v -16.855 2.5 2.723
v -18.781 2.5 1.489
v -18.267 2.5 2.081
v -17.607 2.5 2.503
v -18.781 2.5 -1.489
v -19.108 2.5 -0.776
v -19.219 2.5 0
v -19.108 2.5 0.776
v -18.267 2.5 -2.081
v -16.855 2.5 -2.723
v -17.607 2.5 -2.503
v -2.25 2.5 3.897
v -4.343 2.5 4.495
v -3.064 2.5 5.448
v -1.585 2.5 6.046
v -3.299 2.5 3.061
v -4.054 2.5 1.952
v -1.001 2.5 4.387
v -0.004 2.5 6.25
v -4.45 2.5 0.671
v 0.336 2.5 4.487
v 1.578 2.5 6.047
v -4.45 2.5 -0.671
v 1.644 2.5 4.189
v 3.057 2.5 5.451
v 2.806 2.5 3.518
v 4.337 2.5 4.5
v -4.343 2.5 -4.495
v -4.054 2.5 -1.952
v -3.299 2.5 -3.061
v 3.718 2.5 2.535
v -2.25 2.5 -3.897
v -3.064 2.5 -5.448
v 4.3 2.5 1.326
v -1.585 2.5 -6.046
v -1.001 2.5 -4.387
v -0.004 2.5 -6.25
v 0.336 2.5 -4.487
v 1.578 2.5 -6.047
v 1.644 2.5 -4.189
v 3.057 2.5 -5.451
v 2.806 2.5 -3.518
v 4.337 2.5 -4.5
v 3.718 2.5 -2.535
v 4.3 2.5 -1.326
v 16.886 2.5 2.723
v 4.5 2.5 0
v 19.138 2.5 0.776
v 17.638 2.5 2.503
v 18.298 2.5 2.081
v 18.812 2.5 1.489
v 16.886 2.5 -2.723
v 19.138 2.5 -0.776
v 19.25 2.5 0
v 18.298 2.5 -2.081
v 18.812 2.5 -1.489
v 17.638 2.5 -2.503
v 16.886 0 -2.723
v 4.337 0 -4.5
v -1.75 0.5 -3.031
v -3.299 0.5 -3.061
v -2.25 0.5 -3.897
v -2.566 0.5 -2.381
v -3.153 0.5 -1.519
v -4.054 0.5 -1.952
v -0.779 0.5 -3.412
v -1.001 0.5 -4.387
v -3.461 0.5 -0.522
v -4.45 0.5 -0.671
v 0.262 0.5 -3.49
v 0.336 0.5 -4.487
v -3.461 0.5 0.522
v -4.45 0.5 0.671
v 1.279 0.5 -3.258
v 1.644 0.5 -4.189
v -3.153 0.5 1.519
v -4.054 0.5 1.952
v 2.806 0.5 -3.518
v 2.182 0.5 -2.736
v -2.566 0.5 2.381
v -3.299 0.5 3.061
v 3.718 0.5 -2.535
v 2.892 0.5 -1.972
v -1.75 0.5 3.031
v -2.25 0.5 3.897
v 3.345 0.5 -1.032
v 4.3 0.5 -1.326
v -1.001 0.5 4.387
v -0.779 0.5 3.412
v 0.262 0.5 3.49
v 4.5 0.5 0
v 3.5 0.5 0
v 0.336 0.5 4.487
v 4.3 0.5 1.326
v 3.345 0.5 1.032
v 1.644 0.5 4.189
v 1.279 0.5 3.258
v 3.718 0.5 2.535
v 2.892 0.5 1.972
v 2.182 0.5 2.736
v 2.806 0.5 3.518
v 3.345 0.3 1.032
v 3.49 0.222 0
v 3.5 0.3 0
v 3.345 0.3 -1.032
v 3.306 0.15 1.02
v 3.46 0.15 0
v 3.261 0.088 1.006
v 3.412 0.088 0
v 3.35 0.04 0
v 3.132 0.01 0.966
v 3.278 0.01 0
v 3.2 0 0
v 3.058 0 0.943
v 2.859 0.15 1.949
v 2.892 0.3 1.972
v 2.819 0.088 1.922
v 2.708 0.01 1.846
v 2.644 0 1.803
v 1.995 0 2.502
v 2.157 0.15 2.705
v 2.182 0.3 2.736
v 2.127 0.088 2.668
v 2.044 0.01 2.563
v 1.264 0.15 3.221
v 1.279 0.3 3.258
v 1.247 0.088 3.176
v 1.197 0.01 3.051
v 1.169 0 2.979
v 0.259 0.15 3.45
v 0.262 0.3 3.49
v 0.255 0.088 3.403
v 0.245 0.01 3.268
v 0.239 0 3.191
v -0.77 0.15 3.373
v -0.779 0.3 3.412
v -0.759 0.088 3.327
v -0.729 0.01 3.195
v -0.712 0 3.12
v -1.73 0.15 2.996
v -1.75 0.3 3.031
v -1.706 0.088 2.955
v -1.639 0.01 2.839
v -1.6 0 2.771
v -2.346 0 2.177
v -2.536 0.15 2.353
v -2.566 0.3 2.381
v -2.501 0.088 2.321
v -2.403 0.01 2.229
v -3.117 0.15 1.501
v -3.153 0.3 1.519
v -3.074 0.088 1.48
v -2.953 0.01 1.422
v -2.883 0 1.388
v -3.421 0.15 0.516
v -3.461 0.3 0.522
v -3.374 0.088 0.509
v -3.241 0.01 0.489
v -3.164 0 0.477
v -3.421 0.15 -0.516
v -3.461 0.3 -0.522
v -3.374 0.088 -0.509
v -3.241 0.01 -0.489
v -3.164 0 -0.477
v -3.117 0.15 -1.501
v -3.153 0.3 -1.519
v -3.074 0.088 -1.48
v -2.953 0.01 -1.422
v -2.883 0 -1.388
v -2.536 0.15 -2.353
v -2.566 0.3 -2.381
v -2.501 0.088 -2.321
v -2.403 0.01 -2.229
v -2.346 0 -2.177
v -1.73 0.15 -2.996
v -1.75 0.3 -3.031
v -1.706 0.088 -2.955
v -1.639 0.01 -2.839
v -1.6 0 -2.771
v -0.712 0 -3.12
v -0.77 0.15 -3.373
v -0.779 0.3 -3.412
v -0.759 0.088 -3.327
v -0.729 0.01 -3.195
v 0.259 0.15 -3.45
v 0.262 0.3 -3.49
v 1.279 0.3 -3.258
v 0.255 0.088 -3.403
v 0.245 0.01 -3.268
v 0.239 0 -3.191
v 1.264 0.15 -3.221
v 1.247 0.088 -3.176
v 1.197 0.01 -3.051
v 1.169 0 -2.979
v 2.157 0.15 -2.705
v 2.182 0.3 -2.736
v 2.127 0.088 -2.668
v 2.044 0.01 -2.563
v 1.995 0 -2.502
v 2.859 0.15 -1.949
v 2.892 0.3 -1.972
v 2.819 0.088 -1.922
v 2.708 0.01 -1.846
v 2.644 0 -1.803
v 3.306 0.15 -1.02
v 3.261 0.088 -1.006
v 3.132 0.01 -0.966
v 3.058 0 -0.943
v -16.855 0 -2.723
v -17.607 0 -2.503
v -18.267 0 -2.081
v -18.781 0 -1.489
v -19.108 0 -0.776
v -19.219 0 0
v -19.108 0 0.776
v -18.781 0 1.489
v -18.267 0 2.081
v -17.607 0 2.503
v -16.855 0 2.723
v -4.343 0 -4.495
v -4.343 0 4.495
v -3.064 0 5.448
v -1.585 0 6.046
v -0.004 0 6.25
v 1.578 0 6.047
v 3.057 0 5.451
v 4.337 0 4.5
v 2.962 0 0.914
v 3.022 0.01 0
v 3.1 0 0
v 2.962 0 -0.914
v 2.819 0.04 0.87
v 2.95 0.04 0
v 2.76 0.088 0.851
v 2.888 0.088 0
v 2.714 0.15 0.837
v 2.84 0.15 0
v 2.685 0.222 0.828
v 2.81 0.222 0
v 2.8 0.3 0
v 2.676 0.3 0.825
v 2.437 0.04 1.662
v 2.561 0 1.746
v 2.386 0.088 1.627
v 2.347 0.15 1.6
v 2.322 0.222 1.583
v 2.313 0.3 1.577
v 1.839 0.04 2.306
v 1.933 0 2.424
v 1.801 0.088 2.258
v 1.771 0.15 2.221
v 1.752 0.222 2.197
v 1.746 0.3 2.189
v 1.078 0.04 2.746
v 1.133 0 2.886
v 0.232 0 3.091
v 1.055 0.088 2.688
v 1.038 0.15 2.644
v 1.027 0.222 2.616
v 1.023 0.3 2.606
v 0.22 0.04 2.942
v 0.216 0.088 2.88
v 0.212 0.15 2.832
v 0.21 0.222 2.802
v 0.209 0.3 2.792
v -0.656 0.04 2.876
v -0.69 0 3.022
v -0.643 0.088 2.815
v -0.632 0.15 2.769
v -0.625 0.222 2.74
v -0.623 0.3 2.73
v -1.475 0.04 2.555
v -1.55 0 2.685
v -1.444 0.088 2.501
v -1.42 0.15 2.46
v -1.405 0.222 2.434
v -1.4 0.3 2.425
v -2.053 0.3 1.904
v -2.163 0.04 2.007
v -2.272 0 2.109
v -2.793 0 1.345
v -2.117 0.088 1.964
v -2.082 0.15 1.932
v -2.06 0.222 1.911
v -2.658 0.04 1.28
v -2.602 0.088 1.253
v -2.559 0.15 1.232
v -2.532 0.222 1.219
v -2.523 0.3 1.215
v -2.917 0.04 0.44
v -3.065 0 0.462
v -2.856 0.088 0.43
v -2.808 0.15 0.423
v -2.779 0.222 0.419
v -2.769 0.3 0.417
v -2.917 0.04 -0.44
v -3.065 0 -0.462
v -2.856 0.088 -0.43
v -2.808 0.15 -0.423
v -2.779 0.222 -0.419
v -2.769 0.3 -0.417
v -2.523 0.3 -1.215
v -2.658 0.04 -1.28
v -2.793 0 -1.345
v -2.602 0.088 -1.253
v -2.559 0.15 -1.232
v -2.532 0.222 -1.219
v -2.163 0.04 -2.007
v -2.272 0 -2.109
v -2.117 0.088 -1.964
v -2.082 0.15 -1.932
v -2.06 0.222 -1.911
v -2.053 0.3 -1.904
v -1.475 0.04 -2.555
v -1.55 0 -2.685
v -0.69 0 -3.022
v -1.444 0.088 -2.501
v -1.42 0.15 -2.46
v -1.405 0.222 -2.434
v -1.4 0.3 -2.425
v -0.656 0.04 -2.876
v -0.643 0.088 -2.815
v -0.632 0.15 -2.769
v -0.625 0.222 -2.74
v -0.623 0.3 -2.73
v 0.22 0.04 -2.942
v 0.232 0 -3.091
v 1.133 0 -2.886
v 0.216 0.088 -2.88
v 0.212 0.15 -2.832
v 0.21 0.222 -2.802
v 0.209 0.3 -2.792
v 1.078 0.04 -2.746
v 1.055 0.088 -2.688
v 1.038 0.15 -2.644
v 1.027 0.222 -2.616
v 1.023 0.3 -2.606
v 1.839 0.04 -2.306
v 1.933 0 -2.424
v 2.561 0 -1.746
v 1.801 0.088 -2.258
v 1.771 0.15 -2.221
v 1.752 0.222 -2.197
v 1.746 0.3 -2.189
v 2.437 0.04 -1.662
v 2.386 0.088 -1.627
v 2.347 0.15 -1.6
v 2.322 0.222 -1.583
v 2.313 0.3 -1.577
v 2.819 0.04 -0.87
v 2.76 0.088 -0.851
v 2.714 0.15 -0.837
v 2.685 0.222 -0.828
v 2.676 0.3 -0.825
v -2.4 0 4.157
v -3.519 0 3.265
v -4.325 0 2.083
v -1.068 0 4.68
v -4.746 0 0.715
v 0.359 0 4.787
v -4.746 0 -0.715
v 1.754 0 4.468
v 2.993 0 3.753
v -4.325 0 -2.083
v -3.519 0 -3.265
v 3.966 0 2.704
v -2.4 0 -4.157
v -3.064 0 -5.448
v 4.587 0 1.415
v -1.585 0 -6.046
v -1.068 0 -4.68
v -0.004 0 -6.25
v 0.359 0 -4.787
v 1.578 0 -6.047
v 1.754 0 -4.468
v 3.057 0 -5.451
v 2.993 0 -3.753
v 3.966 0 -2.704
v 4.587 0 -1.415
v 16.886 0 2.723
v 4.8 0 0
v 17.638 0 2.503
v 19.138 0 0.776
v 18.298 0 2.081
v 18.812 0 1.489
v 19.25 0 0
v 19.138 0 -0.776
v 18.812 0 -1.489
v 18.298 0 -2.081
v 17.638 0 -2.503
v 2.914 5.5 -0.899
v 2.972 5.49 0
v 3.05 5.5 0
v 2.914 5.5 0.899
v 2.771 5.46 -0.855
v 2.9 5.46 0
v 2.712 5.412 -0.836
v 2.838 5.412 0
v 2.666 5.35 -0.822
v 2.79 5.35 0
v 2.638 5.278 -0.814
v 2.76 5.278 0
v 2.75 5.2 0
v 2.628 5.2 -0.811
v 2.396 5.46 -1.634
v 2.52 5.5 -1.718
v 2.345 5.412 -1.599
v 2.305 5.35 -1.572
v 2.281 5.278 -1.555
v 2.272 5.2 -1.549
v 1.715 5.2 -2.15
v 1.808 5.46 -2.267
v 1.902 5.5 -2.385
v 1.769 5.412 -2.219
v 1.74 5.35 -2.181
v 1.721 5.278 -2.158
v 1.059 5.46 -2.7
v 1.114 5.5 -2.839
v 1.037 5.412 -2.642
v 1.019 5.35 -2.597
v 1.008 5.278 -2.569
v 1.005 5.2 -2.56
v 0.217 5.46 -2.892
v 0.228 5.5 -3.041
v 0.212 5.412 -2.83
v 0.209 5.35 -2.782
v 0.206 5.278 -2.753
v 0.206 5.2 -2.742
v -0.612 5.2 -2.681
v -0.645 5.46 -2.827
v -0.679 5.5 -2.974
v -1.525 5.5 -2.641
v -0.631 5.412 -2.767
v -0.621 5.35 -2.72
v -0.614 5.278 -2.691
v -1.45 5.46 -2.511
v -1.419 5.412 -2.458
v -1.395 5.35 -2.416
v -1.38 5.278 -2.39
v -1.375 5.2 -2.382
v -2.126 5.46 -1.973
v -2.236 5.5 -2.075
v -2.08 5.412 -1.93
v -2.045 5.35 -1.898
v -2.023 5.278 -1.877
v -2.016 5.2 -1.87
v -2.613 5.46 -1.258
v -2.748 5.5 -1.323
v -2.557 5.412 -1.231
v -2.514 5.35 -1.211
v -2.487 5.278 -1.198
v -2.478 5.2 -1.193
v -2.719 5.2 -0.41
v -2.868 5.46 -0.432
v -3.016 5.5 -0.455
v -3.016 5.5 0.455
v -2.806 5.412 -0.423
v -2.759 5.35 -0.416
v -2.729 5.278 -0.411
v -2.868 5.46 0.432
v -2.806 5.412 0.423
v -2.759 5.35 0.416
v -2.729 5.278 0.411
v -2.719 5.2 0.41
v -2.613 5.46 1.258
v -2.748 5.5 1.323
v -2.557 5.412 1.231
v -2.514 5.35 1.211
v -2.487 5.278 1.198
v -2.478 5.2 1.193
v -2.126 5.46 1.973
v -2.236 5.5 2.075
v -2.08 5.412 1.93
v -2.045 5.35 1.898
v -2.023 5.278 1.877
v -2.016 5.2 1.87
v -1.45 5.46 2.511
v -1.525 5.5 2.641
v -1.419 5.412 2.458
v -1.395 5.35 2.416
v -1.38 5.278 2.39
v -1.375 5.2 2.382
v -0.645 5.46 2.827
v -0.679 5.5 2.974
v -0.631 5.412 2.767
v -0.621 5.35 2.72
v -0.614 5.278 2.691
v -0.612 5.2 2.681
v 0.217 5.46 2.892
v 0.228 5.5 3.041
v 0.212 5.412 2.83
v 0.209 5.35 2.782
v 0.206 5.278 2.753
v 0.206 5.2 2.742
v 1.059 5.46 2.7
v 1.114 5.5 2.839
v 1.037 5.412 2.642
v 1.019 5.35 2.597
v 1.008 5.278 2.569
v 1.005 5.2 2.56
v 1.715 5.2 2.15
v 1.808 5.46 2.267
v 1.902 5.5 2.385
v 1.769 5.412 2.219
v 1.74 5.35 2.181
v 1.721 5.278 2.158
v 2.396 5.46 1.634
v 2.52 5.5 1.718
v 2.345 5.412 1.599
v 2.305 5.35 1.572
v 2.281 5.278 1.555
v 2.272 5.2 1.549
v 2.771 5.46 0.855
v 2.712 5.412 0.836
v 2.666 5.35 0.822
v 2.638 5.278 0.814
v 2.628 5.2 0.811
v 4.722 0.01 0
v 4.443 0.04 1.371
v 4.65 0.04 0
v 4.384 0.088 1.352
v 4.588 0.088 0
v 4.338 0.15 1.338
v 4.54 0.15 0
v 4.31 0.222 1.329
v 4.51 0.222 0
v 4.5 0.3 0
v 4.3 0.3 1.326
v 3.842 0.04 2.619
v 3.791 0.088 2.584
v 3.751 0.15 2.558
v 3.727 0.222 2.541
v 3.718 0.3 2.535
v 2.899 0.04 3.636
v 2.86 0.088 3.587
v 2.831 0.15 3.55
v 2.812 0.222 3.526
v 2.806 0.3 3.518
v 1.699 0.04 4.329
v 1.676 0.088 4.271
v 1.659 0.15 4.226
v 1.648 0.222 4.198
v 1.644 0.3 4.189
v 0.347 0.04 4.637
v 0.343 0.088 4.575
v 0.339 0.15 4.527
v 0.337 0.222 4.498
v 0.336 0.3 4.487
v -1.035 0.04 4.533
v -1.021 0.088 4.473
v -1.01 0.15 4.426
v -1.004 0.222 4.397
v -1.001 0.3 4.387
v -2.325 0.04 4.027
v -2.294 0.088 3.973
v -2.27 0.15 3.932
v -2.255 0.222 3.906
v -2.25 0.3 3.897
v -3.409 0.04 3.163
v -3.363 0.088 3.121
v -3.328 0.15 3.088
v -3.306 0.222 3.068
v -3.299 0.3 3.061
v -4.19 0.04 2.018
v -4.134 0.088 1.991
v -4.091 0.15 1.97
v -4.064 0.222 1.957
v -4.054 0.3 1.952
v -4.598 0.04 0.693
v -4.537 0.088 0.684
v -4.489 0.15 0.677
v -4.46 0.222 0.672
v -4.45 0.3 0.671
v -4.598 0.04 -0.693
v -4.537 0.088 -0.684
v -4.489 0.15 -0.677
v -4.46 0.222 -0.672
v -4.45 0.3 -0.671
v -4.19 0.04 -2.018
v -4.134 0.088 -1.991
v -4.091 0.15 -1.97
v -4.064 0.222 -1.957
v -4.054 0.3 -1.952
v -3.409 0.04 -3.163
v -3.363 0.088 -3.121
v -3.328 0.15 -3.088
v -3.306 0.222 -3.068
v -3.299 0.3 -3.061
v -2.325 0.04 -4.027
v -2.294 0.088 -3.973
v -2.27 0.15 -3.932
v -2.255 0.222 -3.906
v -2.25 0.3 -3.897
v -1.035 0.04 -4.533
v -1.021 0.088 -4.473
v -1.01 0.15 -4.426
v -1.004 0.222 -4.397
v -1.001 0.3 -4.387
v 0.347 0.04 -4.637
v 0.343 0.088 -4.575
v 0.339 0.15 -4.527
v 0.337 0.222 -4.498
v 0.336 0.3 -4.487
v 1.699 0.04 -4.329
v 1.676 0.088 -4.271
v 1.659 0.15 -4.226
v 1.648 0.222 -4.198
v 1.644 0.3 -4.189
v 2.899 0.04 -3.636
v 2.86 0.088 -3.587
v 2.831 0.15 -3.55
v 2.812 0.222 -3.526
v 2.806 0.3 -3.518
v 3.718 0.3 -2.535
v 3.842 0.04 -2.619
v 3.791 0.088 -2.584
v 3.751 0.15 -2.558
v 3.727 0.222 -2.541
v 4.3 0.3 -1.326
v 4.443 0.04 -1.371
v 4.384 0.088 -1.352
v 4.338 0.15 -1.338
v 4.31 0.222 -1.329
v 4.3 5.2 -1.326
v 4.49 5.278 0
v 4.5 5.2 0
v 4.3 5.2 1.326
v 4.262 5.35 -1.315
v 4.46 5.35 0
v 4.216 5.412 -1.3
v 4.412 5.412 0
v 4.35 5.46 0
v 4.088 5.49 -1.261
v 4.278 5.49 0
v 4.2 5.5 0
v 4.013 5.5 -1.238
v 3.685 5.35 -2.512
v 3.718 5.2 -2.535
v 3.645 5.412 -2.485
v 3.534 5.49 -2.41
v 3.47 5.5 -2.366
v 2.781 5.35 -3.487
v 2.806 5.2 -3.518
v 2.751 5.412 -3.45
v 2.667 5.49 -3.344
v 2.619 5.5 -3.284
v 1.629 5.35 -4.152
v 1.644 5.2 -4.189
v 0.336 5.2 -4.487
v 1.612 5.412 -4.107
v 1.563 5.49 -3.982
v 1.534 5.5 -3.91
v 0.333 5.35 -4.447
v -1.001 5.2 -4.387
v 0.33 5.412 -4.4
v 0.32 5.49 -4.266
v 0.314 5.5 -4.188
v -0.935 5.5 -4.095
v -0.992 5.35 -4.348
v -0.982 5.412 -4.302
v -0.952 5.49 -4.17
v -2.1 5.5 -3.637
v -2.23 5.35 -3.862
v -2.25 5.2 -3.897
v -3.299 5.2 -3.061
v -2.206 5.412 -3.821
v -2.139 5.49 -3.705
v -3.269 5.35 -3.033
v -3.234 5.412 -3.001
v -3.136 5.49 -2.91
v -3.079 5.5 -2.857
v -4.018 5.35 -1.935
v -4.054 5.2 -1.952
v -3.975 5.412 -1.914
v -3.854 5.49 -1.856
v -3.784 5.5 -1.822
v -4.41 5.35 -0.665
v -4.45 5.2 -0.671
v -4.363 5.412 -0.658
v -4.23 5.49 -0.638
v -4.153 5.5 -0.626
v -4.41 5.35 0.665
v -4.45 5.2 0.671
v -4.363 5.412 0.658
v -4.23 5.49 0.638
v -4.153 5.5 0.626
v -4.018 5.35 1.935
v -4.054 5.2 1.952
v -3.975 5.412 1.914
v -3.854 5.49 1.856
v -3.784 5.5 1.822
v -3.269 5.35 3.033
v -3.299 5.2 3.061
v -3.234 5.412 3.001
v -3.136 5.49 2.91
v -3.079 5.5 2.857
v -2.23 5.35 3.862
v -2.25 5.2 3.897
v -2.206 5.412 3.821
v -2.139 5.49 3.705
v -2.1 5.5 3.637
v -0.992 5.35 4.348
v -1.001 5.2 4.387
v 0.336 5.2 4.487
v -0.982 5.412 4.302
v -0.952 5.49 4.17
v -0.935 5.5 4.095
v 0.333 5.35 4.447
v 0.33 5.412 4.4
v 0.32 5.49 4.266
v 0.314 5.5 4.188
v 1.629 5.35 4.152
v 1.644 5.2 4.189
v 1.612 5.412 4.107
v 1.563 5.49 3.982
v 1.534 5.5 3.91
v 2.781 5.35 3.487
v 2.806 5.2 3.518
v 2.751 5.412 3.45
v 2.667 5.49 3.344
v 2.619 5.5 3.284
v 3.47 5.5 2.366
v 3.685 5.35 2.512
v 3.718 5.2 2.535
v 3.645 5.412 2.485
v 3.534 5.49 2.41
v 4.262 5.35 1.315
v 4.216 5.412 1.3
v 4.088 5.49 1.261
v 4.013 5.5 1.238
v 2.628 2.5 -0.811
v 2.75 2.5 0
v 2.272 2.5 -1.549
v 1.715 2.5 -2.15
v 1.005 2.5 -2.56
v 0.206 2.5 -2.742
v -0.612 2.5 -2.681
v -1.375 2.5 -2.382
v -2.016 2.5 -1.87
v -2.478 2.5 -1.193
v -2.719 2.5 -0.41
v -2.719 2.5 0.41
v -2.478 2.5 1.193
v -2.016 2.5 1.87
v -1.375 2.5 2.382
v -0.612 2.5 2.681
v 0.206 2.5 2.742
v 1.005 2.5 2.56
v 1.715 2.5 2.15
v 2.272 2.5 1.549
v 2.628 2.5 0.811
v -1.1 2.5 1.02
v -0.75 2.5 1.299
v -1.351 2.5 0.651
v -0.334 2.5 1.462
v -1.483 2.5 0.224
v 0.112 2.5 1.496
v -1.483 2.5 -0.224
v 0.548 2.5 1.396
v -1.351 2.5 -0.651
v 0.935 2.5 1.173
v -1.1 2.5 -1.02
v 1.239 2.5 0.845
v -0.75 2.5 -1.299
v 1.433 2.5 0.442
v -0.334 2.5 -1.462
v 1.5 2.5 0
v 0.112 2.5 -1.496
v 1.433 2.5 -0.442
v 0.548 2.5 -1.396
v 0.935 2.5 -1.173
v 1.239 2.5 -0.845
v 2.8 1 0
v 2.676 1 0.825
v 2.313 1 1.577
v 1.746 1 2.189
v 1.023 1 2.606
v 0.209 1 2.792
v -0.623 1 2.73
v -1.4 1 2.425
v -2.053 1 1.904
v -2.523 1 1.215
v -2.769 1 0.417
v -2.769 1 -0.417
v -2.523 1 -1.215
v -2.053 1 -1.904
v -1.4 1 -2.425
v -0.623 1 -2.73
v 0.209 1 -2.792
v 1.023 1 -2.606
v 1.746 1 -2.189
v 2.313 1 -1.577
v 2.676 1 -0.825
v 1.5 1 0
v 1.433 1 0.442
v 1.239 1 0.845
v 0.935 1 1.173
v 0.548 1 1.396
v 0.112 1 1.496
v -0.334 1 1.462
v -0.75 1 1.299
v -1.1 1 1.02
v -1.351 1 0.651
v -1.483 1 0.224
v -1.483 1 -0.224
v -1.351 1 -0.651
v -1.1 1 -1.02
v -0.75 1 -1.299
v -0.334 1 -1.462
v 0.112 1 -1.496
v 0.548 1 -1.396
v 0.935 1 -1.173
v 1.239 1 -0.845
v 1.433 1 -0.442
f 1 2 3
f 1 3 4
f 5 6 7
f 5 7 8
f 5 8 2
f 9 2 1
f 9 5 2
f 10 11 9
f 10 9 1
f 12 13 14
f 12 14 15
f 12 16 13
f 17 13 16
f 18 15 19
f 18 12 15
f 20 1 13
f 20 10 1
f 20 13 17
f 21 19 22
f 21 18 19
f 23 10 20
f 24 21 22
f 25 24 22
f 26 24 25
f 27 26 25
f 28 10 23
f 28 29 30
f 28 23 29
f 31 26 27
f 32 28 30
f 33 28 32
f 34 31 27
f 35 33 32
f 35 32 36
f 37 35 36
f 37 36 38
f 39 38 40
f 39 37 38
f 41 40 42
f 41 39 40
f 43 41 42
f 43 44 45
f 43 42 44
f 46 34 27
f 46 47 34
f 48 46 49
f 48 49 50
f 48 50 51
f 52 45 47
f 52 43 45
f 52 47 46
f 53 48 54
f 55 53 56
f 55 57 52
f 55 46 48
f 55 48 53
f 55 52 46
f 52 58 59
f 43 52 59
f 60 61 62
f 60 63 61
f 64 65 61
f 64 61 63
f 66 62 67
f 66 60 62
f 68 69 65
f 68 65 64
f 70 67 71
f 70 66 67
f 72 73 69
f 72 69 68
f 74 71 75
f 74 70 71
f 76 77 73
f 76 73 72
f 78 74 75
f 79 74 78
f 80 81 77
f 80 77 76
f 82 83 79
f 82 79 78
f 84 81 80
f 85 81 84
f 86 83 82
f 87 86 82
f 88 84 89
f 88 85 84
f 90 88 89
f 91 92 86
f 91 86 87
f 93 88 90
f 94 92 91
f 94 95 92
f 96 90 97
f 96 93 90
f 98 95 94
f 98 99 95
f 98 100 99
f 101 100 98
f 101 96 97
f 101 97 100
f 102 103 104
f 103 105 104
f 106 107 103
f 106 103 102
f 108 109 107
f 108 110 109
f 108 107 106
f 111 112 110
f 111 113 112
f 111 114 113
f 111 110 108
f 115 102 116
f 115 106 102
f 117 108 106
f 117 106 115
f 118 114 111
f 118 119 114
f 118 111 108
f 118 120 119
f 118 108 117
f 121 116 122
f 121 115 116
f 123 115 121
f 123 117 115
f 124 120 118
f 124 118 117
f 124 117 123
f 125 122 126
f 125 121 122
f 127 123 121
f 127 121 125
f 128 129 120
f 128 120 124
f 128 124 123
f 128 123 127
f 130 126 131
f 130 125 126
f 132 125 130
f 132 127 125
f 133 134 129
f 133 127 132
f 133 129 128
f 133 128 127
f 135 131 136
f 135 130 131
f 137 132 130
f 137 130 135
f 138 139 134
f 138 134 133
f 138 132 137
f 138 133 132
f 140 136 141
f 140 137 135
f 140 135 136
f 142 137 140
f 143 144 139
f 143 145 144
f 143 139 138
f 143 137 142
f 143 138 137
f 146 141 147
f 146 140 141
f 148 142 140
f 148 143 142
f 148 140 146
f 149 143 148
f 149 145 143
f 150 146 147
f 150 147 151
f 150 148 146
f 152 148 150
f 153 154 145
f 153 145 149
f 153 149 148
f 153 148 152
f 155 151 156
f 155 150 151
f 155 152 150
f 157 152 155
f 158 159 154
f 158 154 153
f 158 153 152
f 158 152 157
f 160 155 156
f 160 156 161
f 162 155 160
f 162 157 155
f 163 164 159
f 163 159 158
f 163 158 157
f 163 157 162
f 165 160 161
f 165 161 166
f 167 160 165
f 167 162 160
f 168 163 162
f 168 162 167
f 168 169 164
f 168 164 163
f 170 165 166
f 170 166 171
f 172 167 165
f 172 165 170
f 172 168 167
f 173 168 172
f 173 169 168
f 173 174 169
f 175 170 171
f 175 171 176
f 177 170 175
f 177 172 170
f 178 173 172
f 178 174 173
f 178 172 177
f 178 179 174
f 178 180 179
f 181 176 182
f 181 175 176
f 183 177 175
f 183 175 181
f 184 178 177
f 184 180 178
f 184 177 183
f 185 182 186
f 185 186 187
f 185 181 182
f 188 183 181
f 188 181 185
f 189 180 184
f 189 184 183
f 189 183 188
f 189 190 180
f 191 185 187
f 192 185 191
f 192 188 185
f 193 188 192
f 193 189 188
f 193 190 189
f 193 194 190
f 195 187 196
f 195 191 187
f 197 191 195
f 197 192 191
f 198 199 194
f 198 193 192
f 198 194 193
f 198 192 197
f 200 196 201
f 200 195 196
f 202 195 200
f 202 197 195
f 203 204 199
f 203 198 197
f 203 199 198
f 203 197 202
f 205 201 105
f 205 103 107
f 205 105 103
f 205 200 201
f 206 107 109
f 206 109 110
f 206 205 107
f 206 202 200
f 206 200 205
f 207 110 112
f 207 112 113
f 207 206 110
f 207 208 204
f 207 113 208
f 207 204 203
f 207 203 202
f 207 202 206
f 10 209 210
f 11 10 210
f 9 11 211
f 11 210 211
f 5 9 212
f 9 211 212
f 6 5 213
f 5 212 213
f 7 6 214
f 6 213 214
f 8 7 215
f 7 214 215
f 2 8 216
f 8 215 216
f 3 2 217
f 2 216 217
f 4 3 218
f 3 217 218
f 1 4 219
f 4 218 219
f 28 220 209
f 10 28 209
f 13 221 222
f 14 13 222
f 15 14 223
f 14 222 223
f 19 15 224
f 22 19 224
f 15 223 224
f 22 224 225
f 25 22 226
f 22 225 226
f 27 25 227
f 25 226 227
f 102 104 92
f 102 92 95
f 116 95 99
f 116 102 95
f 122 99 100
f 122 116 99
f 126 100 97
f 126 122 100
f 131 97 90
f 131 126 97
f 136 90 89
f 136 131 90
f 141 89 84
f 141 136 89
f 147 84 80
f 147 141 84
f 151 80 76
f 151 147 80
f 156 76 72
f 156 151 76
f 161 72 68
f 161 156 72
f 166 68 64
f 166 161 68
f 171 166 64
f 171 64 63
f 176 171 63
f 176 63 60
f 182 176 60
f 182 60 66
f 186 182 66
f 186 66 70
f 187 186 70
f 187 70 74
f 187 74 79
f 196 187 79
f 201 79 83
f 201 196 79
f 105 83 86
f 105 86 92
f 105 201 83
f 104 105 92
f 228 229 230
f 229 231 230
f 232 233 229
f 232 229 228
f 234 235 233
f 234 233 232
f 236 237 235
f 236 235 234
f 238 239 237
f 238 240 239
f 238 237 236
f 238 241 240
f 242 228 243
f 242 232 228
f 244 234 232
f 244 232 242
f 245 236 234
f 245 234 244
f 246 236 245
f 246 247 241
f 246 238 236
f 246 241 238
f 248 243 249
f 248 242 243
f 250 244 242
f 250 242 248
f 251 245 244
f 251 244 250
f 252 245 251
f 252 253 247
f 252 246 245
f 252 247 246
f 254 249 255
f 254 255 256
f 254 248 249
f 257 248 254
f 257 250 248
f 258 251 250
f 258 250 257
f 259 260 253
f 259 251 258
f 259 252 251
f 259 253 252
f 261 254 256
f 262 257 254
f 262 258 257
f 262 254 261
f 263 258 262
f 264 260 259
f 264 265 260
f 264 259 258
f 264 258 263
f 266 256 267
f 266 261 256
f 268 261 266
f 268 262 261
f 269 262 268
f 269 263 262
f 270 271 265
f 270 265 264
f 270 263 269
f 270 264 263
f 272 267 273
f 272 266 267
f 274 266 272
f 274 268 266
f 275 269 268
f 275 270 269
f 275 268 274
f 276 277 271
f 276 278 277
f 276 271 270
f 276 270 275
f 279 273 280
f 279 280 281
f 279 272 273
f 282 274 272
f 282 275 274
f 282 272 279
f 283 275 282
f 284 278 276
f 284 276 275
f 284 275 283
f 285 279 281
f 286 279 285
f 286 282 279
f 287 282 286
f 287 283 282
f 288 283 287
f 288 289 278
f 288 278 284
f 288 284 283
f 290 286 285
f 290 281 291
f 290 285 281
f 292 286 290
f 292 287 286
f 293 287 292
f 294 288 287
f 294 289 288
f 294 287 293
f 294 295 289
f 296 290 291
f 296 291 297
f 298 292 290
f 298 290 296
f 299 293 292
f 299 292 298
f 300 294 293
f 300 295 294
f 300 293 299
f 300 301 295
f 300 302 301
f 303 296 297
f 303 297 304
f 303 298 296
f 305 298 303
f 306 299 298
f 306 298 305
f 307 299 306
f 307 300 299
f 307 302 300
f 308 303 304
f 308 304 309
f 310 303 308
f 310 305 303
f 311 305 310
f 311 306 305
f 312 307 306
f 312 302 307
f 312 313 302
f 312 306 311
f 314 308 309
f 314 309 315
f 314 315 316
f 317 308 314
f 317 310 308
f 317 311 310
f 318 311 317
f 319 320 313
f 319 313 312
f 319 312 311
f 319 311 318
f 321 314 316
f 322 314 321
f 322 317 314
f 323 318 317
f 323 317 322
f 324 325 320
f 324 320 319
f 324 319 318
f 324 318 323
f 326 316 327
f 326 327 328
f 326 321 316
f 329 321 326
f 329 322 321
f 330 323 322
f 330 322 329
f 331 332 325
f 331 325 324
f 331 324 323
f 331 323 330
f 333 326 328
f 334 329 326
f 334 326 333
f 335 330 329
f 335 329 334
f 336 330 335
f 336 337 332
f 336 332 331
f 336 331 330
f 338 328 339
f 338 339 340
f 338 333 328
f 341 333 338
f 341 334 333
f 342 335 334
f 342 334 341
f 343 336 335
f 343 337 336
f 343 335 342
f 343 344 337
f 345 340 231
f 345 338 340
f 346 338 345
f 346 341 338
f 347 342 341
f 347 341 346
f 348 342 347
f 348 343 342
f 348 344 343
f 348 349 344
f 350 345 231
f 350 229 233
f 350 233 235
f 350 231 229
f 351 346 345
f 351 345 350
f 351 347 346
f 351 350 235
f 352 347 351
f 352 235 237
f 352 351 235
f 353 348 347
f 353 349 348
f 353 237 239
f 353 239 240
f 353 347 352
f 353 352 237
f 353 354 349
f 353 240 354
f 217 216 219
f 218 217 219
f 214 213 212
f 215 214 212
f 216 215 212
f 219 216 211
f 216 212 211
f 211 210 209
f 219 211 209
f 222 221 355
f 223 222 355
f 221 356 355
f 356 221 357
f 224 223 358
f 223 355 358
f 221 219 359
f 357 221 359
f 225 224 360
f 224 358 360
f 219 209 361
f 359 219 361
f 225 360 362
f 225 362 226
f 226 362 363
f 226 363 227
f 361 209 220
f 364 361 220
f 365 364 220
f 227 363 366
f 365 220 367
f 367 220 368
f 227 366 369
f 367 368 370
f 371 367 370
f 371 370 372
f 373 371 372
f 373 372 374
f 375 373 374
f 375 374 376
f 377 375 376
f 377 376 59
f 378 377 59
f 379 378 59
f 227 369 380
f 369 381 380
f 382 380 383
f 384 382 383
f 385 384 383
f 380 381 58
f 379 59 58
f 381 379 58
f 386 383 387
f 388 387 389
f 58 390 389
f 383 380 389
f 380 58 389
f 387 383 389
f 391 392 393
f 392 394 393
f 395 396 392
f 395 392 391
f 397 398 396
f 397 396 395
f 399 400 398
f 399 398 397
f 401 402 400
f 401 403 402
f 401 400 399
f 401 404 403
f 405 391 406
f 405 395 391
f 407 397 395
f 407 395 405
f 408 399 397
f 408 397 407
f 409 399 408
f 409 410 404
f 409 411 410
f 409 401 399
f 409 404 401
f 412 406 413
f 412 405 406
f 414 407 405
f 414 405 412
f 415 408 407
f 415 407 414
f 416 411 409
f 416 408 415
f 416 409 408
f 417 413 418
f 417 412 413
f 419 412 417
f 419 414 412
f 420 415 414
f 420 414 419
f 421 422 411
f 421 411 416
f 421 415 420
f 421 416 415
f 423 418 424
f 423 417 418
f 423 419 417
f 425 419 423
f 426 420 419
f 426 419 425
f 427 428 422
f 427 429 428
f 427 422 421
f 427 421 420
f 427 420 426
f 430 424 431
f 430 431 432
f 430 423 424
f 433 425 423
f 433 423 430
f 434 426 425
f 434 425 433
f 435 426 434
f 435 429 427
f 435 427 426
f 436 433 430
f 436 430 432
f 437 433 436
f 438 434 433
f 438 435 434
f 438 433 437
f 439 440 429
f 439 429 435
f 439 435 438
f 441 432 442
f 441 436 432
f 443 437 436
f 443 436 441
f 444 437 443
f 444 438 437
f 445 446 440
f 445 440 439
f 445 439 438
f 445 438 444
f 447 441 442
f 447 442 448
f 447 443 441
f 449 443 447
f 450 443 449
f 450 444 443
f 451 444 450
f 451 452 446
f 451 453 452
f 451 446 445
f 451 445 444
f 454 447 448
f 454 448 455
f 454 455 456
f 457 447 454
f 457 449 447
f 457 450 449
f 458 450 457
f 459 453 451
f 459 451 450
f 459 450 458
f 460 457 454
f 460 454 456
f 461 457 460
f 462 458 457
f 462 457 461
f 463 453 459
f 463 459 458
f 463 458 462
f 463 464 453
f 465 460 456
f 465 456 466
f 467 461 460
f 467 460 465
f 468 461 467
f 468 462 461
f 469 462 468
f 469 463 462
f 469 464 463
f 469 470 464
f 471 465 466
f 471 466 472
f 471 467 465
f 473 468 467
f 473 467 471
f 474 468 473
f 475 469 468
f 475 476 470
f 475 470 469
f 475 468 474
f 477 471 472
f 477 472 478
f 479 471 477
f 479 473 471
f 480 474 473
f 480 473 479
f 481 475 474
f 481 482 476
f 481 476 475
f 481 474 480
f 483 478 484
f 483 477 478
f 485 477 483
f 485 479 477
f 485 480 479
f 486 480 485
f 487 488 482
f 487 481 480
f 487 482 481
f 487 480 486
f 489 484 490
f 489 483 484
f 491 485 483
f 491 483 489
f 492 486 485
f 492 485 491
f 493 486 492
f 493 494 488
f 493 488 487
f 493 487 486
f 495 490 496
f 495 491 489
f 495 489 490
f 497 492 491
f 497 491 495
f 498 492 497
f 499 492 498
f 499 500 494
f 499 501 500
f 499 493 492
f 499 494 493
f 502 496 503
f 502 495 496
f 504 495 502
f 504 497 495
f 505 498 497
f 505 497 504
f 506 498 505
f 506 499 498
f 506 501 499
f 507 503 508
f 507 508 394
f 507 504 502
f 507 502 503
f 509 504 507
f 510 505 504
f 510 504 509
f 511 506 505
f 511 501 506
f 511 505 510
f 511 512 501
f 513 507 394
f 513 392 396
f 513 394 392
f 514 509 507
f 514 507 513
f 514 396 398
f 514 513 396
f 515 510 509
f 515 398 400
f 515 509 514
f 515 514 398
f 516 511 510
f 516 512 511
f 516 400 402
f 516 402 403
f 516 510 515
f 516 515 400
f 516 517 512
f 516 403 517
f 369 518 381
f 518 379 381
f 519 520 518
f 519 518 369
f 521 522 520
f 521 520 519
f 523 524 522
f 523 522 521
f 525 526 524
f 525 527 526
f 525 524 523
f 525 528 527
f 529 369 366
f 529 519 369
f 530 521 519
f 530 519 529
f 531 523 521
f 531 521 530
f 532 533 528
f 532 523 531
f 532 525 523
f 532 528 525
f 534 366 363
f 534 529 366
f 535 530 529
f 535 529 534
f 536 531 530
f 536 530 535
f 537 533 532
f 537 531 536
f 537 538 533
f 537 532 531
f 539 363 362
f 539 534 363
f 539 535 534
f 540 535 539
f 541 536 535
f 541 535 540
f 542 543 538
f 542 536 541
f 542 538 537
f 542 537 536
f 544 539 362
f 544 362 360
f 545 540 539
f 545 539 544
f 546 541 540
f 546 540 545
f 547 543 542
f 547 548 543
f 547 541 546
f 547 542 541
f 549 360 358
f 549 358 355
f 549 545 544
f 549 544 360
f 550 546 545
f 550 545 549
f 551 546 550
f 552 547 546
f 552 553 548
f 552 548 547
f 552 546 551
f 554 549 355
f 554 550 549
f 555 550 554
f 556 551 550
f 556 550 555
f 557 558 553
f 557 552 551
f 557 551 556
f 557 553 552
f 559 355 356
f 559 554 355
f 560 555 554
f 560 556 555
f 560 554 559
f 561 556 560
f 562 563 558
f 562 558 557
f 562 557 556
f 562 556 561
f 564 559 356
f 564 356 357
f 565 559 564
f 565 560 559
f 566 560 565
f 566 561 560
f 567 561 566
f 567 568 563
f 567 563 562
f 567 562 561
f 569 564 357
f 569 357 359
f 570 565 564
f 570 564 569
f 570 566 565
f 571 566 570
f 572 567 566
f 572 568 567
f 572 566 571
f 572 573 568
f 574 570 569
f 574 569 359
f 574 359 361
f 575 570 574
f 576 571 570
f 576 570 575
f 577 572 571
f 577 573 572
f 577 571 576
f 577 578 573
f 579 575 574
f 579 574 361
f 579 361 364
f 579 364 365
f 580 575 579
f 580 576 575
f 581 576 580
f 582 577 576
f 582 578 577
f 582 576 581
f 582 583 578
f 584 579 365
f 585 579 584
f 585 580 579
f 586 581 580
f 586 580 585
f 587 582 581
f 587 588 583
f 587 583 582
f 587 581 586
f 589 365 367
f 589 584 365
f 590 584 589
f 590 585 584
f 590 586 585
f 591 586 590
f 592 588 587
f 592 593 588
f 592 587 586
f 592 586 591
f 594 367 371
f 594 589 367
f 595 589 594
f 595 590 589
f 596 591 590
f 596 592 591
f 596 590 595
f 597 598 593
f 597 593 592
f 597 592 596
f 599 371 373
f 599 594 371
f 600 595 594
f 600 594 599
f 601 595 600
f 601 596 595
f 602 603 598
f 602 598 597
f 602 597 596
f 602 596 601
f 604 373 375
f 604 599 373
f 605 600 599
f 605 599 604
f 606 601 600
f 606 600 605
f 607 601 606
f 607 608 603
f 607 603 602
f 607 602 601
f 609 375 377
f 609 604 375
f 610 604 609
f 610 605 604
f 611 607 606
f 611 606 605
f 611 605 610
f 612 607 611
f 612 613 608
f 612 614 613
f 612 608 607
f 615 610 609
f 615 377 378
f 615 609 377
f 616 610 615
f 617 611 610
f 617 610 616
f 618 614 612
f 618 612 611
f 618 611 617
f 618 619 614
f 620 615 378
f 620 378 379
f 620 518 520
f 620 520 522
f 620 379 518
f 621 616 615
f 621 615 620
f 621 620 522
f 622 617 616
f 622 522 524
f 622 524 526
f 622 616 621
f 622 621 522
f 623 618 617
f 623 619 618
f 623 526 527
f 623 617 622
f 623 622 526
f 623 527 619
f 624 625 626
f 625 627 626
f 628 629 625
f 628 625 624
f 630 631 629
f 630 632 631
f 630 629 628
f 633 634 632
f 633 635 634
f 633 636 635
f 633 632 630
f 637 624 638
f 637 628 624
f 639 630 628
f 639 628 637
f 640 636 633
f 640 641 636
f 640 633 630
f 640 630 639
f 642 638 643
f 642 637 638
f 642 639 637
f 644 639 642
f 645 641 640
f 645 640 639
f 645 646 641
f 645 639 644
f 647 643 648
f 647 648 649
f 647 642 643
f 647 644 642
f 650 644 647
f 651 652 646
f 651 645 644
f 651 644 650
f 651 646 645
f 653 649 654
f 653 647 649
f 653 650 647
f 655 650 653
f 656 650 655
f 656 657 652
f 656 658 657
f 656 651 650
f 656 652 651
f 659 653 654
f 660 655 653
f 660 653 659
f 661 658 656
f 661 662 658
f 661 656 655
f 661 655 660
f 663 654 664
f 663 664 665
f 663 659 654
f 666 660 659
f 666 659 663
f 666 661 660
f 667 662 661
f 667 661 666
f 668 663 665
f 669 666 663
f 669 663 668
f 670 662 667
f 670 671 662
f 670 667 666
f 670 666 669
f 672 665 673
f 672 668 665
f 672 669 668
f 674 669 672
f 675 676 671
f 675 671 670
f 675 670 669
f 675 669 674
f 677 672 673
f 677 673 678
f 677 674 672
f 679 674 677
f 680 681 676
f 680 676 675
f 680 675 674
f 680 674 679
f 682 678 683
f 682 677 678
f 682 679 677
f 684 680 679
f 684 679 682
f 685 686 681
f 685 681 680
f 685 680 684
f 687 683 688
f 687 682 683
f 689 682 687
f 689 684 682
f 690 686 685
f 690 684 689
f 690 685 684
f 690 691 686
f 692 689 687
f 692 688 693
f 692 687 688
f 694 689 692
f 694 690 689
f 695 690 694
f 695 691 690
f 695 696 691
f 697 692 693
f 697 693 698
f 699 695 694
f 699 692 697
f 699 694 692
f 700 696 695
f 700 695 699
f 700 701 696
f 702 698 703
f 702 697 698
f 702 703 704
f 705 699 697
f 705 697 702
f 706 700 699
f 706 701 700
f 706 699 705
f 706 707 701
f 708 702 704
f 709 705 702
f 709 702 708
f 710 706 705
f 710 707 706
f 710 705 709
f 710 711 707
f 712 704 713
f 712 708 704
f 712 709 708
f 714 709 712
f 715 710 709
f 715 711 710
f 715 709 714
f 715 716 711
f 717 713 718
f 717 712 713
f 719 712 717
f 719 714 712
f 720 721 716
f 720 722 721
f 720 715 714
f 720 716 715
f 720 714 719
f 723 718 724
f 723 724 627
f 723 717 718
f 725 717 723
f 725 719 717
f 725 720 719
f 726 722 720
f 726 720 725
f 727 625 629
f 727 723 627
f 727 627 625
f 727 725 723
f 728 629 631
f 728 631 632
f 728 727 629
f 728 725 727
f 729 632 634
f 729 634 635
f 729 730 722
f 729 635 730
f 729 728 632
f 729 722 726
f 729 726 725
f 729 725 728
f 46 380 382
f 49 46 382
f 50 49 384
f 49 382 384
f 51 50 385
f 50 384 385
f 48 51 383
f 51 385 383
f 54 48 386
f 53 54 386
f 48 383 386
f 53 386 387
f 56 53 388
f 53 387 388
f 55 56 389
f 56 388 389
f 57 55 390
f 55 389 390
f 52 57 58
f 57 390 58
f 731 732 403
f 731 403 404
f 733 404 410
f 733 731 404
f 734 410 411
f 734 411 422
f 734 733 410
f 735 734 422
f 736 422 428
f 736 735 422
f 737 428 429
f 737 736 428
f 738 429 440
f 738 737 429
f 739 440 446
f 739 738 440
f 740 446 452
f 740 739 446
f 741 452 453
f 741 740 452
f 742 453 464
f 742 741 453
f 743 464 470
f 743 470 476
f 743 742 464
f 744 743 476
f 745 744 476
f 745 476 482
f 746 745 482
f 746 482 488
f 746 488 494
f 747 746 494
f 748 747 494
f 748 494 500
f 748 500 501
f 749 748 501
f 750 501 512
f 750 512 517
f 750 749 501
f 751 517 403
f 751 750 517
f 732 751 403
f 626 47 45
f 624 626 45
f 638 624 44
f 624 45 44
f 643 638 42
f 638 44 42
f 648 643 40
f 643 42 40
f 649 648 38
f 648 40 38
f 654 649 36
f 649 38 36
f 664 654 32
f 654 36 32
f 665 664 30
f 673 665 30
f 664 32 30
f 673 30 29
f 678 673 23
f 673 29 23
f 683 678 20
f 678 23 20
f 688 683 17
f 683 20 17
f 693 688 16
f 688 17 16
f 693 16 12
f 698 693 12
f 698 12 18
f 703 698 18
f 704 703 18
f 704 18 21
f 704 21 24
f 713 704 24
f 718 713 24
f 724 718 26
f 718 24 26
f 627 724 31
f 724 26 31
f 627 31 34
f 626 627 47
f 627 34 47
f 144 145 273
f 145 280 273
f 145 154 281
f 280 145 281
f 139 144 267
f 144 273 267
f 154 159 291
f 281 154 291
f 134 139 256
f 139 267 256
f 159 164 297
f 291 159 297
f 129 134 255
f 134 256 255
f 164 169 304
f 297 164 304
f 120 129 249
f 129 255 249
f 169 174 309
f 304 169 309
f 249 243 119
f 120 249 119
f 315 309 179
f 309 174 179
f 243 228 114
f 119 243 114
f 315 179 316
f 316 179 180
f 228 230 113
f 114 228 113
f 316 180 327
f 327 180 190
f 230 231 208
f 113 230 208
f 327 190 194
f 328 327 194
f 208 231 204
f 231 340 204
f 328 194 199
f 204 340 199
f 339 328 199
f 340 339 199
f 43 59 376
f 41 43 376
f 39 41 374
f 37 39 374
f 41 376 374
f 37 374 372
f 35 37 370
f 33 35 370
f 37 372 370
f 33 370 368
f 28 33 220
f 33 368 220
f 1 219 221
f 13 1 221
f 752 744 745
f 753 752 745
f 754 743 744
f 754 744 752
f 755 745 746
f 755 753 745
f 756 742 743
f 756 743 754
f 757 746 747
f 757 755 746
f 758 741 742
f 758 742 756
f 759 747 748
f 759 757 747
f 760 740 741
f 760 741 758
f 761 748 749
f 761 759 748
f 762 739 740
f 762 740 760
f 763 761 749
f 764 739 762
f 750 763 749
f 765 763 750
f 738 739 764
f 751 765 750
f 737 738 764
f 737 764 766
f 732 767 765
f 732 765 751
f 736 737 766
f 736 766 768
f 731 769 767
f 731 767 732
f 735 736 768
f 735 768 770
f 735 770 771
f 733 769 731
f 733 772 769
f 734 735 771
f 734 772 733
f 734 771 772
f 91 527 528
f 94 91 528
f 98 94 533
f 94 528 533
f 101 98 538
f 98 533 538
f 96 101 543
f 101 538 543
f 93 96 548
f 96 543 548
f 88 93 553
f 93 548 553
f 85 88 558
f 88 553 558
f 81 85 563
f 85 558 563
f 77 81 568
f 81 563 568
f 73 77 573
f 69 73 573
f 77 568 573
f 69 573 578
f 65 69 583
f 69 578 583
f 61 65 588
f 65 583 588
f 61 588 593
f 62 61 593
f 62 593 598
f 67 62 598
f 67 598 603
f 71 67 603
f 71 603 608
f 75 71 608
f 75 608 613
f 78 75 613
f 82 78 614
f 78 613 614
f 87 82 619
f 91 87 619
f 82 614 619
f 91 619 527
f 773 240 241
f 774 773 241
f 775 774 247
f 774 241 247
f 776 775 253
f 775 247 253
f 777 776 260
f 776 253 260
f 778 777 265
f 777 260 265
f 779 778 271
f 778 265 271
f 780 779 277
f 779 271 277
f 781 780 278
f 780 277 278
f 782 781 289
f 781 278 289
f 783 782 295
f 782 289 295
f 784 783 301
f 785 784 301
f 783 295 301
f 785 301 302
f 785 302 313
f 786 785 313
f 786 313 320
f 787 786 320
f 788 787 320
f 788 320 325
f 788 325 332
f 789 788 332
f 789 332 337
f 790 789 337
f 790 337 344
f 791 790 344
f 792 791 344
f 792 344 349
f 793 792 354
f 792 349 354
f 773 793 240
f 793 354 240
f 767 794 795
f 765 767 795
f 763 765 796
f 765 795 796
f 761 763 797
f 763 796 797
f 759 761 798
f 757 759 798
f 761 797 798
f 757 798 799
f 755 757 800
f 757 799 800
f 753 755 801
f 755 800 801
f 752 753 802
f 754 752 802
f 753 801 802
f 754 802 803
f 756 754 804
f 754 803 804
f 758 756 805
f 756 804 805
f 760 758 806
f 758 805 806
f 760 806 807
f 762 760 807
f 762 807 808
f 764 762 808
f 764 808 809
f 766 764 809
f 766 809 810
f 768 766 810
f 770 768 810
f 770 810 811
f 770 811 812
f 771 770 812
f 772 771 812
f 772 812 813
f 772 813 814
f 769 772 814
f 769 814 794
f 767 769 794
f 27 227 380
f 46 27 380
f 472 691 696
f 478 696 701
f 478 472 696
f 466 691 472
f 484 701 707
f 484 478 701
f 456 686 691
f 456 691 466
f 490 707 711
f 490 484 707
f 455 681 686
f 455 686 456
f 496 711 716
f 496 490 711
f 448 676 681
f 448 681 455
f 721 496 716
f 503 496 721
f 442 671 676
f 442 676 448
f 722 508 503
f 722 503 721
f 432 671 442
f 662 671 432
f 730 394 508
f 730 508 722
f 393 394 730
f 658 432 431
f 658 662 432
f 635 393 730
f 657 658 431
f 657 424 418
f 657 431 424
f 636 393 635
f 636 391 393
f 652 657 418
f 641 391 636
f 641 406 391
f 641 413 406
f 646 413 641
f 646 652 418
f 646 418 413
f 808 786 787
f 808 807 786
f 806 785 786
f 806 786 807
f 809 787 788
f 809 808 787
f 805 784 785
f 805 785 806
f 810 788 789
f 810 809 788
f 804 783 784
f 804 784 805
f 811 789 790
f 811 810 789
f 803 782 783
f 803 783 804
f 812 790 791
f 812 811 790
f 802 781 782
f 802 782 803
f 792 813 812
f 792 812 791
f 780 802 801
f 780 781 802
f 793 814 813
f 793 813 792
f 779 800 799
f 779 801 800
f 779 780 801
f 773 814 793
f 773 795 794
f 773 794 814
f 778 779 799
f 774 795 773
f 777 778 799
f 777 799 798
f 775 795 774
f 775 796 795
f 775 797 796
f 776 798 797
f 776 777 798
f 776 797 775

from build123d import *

# Parameters (mm, degrees)
SALIENTE_EXTRUIR1_DEPTH = 2.5
CROQUIS2_R              = 4.5
CROQUIS2_R_2            = 2.75
SALIENTE_EXTRUIR2_DEPTH = 3
CORTAR_EXTRUIR1_REACH   = 7.5
CROQUIS3_R              = 1.5
CROQUIS4_R              = 2.8
CORTAR_EXTRUIR2_DEPTH   = 1
CROQUIS5_R              = 4.5
CROQUIS5_R_2            = 3.5
CORTAR_EXTRUIR3_DEPTH   = 0.5
REDONDEO1_R             = 0.3


with BuildPart() as part:
    # Croquis1 → Saliente-Extruir1 (new body)
    with BuildSketch(Plane(origin=(0, 0, 0), x_dir=(1, 0, 0), z_dir=(0, 1, 0))):
        with BuildLine():
            Line((16.885625022, 2.722828188), (4.337337893, 4.5))
            ThreePointArc((4.337337893, 4.5), (-0.003678449, 6.249998918), (-4.342631854, 4.494891387))
            Line((-4.342631854, 4.494891387), (-16.854847994, 2.722828188))
            ThreePointArc((-16.854847994, 2.722828188), (-19.219222971, 0), (-16.854847994, -2.722828188))
            Line((-16.854847994, -2.722828188), (-4.342631854, -4.494891387))
            ThreePointArc((-4.342631854, -4.494891387), (-0.003678449, -6.249998918), (4.337337893, -4.5))
            Line((4.337337893, -4.5), (16.885625022, -2.722828188))
            ThreePointArc((16.885625022, -2.722828188), (19.25, 0), (16.885625022, 2.722828188))
        make_face()
    extrude(amount=SALIENTE_EXTRUIR1_DEPTH)

    # Croquis2 → Saliente-Extruir2 (add)
    with BuildSketch(Plane(origin=(0, 2.5, 0), x_dir=(1, 0, 0), z_dir=(0, 1, 0))):
        Circle(CROQUIS2_R)
        Circle(CROQUIS2_R_2, mode=Mode.SUBTRACT)
    extrude(amount=SALIENTE_EXTRUIR2_DEPTH)

    # Croquis3 → Cortar-Extruir1 (cut, up to next)
    with BuildSketch(Plane.XZ, mode=Mode.PRIVATE) as cortar_extruir1_sk1:
        Circle(CROQUIS3_R)
    cortar_extruir1_tool1 = extrude(cortar_extruir1_sk1.sketch, amount=-CORTAR_EXTRUIR1_REACH, mode=Mode.PRIVATE) & part.part
    add(cortar_extruir1_tool1.solids().sort_by_distance((0, 0, 0))[0], mode=Mode.SUBTRACT)

    # Croquis4 → Cortar-Extruir2 (cut)
    with BuildSketch(Plane.XZ):
        Circle(CROQUIS4_R)
    extrude(amount=-CORTAR_EXTRUIR2_DEPTH, mode=Mode.SUBTRACT)

    # Croquis5 → Cortar-Extruir3 (cut)
    with BuildSketch(Plane.XZ):
        Circle(CROQUIS5_R)
        Circle(CROQUIS5_R_2, mode=Mode.SUBTRACT)
    extrude(amount=-CORTAR_EXTRUIR3_DEPTH, mode=Mode.SUBTRACT)

    # Redondeo1
    redondeo1_edges = [part.edges().sort_by_distance(p)[0] for p in [
        (-4.5, 5.5, 0),
        (-2.75, 5.5, 0),
        (-2.8, 0, 0),
        (-4.5, 0, 0),
        (-3.5, 0, 0),
    ]]
    fillet(redondeo1_edges, radius=REDONDEO1_R)


solid = part.part
